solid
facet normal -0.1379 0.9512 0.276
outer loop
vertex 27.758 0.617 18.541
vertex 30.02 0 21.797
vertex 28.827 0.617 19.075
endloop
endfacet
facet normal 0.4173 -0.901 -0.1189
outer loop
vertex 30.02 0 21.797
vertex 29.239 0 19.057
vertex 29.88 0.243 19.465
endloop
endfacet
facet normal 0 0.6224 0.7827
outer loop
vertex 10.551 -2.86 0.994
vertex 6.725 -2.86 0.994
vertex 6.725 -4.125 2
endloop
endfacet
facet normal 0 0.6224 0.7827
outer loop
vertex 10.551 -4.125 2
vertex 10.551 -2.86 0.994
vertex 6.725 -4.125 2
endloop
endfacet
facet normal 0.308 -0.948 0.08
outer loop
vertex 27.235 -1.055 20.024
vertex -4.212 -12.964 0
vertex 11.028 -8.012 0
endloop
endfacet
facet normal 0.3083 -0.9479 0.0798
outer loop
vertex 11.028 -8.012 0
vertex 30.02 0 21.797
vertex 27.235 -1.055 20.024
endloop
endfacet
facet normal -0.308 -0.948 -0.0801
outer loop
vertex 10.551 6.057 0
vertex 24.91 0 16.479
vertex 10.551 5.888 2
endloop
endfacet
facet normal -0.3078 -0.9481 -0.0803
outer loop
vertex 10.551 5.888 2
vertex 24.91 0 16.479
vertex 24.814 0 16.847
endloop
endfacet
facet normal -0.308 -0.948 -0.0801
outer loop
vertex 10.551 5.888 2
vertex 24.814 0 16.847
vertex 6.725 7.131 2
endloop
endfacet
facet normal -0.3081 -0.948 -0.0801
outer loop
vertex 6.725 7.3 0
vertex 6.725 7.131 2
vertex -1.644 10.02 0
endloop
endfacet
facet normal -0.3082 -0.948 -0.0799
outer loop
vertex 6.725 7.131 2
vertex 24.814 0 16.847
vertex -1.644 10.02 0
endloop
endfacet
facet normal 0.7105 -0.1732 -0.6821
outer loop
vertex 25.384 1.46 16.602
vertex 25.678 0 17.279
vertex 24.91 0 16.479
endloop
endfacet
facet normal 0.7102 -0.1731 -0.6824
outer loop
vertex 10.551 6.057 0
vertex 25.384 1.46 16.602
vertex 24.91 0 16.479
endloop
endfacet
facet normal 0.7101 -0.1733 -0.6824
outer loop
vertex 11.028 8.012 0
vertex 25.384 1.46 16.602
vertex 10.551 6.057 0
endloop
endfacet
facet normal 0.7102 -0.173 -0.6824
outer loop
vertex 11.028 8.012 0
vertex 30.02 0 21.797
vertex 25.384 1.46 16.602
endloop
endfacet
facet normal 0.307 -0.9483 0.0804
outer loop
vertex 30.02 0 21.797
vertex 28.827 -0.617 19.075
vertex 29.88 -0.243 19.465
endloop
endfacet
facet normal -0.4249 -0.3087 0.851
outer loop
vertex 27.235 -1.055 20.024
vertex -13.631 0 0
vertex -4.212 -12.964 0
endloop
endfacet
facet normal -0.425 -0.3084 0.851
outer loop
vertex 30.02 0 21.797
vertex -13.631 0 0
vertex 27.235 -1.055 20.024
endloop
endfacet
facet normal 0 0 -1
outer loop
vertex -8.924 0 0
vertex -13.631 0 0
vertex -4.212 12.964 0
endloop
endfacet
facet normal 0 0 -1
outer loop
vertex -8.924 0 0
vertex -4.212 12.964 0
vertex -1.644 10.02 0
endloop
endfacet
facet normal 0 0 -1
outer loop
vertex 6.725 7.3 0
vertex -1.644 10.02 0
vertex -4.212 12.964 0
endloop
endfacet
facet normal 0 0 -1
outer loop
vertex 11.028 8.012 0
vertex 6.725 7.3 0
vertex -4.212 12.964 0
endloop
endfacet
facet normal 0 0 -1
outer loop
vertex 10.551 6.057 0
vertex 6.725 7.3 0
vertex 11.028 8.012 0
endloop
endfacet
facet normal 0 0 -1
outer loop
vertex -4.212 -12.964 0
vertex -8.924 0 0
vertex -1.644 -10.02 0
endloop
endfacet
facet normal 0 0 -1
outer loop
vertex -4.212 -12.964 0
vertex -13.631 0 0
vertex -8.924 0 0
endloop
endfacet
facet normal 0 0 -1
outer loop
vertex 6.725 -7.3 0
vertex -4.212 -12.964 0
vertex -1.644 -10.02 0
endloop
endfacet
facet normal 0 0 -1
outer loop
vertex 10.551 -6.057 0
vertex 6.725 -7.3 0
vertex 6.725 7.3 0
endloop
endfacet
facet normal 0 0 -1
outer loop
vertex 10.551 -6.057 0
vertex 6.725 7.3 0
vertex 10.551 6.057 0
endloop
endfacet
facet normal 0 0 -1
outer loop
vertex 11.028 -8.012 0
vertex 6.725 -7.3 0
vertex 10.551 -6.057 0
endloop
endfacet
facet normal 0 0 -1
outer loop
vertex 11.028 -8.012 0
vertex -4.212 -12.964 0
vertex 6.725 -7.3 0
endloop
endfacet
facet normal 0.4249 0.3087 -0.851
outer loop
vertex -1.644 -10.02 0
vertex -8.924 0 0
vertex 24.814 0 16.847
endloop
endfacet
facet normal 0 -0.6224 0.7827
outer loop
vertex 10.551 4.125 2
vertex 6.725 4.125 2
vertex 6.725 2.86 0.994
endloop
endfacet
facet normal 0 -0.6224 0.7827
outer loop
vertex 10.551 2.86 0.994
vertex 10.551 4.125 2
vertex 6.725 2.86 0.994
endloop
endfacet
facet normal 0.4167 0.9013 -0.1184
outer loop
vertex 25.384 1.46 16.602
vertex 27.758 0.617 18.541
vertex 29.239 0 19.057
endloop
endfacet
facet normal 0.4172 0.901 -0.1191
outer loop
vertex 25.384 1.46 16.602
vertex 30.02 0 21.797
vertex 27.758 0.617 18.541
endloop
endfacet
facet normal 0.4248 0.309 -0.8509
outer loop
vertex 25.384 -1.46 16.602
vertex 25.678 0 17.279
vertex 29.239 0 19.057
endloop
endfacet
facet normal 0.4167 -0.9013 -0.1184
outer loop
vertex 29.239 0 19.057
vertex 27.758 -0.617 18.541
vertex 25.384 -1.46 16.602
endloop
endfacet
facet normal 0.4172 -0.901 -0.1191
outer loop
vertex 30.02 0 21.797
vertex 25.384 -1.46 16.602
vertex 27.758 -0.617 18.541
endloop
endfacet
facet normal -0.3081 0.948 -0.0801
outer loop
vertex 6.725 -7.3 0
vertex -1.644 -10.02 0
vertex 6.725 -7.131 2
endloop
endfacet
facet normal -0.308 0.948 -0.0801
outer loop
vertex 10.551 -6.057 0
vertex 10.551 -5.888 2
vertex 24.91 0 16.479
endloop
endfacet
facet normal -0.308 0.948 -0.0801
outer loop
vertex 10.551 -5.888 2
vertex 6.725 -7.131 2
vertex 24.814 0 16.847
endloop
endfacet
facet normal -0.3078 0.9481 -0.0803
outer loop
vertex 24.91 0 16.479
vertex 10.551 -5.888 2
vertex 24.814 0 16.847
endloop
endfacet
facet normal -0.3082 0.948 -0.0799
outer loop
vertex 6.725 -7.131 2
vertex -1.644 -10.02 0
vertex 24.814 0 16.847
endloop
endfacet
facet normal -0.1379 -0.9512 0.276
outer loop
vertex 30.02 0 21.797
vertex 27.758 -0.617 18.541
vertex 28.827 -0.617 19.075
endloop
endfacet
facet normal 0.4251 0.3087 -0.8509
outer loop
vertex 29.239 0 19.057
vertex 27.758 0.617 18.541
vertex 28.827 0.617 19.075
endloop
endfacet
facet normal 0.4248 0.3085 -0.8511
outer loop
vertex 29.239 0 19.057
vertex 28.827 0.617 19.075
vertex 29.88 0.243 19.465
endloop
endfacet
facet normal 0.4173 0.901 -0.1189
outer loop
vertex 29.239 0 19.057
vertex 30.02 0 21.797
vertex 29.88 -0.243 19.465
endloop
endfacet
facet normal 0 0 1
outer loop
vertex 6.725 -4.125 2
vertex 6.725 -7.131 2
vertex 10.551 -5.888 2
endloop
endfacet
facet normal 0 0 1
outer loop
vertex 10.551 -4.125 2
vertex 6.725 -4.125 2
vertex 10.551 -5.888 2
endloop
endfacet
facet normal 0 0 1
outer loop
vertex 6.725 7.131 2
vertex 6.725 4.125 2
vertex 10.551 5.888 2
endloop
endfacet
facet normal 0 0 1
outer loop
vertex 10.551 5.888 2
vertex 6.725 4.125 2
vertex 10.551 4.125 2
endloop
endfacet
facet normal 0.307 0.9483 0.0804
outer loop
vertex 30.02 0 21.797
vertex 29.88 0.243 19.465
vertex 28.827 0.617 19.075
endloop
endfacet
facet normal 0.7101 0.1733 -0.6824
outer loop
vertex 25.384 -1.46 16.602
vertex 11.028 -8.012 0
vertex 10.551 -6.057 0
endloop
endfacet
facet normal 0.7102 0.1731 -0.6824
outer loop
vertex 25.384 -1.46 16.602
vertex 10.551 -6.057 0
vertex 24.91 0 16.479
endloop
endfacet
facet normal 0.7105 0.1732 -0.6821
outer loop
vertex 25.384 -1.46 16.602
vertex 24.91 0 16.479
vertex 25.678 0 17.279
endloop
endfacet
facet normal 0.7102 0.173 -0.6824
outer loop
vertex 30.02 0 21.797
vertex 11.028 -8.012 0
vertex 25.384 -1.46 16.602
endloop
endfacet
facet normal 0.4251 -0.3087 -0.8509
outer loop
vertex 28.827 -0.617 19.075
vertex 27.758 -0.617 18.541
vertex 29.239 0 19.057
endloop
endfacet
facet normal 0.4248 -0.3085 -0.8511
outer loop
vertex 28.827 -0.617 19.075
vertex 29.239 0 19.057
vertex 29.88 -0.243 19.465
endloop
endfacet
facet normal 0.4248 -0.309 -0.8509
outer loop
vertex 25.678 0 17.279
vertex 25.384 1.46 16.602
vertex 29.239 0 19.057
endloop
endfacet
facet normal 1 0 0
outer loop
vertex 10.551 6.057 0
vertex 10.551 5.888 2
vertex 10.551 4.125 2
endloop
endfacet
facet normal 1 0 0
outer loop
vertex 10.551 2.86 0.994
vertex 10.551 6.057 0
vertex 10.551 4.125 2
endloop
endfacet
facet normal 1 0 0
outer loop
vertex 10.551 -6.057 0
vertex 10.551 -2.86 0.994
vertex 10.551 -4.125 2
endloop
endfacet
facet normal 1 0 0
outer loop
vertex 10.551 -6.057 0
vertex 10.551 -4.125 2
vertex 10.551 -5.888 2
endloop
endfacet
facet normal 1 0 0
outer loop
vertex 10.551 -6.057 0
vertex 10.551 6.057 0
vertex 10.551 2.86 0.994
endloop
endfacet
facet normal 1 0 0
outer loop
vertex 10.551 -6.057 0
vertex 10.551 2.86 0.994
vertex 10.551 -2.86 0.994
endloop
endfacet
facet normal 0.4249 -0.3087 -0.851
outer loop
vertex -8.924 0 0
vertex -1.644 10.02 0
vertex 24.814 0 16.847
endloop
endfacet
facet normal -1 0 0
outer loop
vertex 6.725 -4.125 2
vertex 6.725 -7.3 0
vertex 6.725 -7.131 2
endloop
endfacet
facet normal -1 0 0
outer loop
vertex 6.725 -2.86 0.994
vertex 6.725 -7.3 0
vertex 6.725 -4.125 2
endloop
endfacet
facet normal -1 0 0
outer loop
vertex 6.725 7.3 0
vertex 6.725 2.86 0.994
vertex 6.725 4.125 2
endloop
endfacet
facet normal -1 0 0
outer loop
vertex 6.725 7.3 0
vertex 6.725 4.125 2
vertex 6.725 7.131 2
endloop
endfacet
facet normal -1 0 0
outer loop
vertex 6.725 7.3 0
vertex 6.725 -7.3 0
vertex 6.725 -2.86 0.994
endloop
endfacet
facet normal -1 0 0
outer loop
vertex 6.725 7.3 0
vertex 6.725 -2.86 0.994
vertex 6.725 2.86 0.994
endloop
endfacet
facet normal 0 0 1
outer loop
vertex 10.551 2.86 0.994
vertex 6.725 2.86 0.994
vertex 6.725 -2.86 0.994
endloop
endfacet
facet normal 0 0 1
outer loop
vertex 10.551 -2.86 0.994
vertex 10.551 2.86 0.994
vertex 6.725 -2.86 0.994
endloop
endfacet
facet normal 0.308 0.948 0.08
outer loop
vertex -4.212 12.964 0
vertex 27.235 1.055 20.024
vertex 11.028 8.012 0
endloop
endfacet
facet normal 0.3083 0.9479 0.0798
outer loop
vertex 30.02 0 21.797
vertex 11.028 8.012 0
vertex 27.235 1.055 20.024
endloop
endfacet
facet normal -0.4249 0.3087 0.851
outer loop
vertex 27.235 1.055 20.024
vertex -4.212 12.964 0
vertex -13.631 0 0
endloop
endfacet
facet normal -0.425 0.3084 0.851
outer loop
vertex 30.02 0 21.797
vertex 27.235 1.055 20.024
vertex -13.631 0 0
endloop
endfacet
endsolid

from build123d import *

# Parameters (mm, degrees)
F10_DEPTH = 2
F11_DEPTH = 2
F12_DEPTH = 2
F13_DEPTH = 2
F14_W     = 8.485019207
F14_H     = 5.5162683129
F15_DEPTH = 25.4
F16_W     = 22.2342889756
F16_H     = 4.6487008221
F17_DEPTH = 25.4
F18_W     = 7.9449899495
F18_H     = 7.2886322159
F19_DEPTH = 25.4
F20_W     = 5.9225577861
F20_H     = 11.3939000294
F21_DEPTH = 25.4
F22_DEPTH = 25.4
F24_DEPTH = 2
F25_W     = 2.8602282982
F25_H     = 1.0062001161
F26_DEPTH = 25.4


with BuildPart() as f10:
    # F9 (on 3pt) → F10 (new body)
    with BuildSketch(Plane(origin=(3.3858576339, 10.4205982991, 0.8801059814), x_dir=(-0.9513782964, 0.3069321376, 0.0259229655), z_dir=(0.308024897, 0.9480031547, 0.0800667316))):
        Polygon((7.9863190401, -1.0910055423), (-27.9953896476, 21.7198480533), (-8.0322433603, -0.6742785071), align=None)
    extrude(amount=-F10_DEPTH)

    # F7 (on 3pt) → F11 (join)
    with BuildSketch(Plane(origin=(-2.4612159584, 1.7881780643, 4.9288143129), x_dir=(0.9052277817, 0.144920932, 0.3994503557), z_dir=(-0.4249266563, 0.3087272871, 0.8509552274))):
        Polygon((35.8818855958, -7.4339114282), (-1.9342501918, 12.1864421859), (-12.3389909213, 0), align=None)
    extrude(amount=-F11_DEPTH)

    # F6 (on 3pt) → F12 (join)
    with BuildSketch(Plane(origin=(-2.4612159584, -1.7881780643, 4.9288143129), x_dir=(0.9052277817, -0.144920932, 0.3994503557), z_dir=(-0.4249266563, -0.3087272871, 0.8509552274))):
        Polygon((-1.9342501918, -12.1864421859), (35.8818855958, 7.4339114282), (-12.3389909213, 0), align=None)
    extrude(amount=-F12_DEPTH)

    # F5 (on face) → F13 (join)
    with BuildSketch(Plane(origin=(3.3858576339, -10.4205982991, 0.8801059814), x_dir=(0.9513782964, 0.3069321376, -0.0259229655), z_dir=(0.308024897, -0.9480031547, 0.0800667316))):
        Polygon((8.0322433603, -0.6742785071), (27.9953896476, 21.7198480533), (-7.9863190401, -1.0910055423), align=None)
    extrude(amount=-F13_DEPTH)

    # F14 (on face) → F15 (cut)
    with BuildSketch(Plane(origin=(3.3858576339, -10.4205982991, 0.8801059814), x_dir=(0.9513782964, 0.3069321376, -0.0259229655), z_dir=(0.308024897, -0.9480031547, 0.0800667316))):
        with Locations((25.7894098759, 19.5572990924)):
            Rectangle(F14_W, F14_H)
    extrude(amount=F15_DEPTH, mode=Mode.SUBTRACT)

    # F16 (on face) → F17 (cut)
    with BuildSketch(Plane(origin=(-2.4612159584, 1.7881780643, 4.9288143129), x_dir=(0.9052277817, 0.144920932, 0.3994503557), z_dir=(-0.4249266563, 0.3087272871, 0.8509552274))):
        with Locations((32.4524613097, -6.6612462979)):
            Rectangle(F16_W, F16_H)
    extrude(amount=F17_DEPTH, mode=Mode.SUBTRACT)

    # F18 (on face) → F19 (cut)
    with BuildSketch(Plane(origin=(-2.4612159584, -1.7881780643, 4.9288143129), x_dir=(0.9052277817, -0.144920932, 0.3994503557), z_dir=(-0.4249266563, -0.3087272871, 0.8509552274))):
        with Locations((35.5167929083, 5.7378442725)):
            Rectangle(F18_W, F18_H)
    extrude(amount=F19_DEPTH, mode=Mode.SUBTRACT)

    # F20 (on face) → F21 (cut)
    with BuildSketch(Plane(origin=(3.3858576339, 10.4205982991, 0.8801059814), x_dir=(-0.9513782964, 0.3069321376, 0.0259229655), z_dir=(0.308024897, 0.9480031547, 0.0800667316))):
        with Locations((-26.7476057634, 18.5779468156)):
            Rectangle(F20_W, F20_H)
    extrude(amount=F21_DEPTH, mode=Mode.SUBTRACT)

    # F0 (on Top) → F22 (cut)
    with BuildSketch(Plane.XY):
        Polygon((11.027559638, -8.0119910571), (11.027559638, 8.0119910571), (-4.2121529688, 12.963673848), (-13.6308133385, 0), (-4.2121529688, -12.963673848), align=None)
    extrude(amount=-F22_DEPTH, mode=Mode.SUBTRACT)

    # F23 (on face) → F24 (join)
    with BuildSketch(Plane(origin=(0, 0, 0), x_dir=(1, 0, 0), z_dir=(0, 0, -1))):
        Polygon((6.725183616, 3.5935375892), (6.725183616, -3.5935375892), (10.5510387165, -6.0571244693), (10.5510387165, 6.0571244693), align=None)
        Polygon((10.5510387165, -6.0571244693), (6.725183616, -3.5935375892), (6.725183616, -7.3002201464), align=None)
        Polygon((6.725183616, 7.3002201464), (6.725183616, 3.5935375892), (10.5510387165, 6.0571244693), align=None)
    extrude(amount=-F24_DEPTH)

    # F25 (on face) → F26 (cut)
    with BuildSketch(Plane(origin=(6.725183616, 0, 0), x_dir=(0, -1, 0), z_dir=(-1, 0, 0))):
        Polygon((2.8602282982, 2), (2.8602282982, 0.9937998839), (4.1250204667, 2), align=None)
        with Locations((1.4301141491, 1.4968999419)):
            Rectangle(F25_W, F25_H)
        with Locations((-1.4301141491, 1.4968999419)):
            Rectangle(F25_W, F25_H)
        Polygon((-4.1250204667, 2), (-2.8602282982, 0.9937998839), (-2.8602282982, 2), align=None)
    extrude(amount=-F26_DEPTH, mode=Mode.SUBTRACT)


solid = f10.part
